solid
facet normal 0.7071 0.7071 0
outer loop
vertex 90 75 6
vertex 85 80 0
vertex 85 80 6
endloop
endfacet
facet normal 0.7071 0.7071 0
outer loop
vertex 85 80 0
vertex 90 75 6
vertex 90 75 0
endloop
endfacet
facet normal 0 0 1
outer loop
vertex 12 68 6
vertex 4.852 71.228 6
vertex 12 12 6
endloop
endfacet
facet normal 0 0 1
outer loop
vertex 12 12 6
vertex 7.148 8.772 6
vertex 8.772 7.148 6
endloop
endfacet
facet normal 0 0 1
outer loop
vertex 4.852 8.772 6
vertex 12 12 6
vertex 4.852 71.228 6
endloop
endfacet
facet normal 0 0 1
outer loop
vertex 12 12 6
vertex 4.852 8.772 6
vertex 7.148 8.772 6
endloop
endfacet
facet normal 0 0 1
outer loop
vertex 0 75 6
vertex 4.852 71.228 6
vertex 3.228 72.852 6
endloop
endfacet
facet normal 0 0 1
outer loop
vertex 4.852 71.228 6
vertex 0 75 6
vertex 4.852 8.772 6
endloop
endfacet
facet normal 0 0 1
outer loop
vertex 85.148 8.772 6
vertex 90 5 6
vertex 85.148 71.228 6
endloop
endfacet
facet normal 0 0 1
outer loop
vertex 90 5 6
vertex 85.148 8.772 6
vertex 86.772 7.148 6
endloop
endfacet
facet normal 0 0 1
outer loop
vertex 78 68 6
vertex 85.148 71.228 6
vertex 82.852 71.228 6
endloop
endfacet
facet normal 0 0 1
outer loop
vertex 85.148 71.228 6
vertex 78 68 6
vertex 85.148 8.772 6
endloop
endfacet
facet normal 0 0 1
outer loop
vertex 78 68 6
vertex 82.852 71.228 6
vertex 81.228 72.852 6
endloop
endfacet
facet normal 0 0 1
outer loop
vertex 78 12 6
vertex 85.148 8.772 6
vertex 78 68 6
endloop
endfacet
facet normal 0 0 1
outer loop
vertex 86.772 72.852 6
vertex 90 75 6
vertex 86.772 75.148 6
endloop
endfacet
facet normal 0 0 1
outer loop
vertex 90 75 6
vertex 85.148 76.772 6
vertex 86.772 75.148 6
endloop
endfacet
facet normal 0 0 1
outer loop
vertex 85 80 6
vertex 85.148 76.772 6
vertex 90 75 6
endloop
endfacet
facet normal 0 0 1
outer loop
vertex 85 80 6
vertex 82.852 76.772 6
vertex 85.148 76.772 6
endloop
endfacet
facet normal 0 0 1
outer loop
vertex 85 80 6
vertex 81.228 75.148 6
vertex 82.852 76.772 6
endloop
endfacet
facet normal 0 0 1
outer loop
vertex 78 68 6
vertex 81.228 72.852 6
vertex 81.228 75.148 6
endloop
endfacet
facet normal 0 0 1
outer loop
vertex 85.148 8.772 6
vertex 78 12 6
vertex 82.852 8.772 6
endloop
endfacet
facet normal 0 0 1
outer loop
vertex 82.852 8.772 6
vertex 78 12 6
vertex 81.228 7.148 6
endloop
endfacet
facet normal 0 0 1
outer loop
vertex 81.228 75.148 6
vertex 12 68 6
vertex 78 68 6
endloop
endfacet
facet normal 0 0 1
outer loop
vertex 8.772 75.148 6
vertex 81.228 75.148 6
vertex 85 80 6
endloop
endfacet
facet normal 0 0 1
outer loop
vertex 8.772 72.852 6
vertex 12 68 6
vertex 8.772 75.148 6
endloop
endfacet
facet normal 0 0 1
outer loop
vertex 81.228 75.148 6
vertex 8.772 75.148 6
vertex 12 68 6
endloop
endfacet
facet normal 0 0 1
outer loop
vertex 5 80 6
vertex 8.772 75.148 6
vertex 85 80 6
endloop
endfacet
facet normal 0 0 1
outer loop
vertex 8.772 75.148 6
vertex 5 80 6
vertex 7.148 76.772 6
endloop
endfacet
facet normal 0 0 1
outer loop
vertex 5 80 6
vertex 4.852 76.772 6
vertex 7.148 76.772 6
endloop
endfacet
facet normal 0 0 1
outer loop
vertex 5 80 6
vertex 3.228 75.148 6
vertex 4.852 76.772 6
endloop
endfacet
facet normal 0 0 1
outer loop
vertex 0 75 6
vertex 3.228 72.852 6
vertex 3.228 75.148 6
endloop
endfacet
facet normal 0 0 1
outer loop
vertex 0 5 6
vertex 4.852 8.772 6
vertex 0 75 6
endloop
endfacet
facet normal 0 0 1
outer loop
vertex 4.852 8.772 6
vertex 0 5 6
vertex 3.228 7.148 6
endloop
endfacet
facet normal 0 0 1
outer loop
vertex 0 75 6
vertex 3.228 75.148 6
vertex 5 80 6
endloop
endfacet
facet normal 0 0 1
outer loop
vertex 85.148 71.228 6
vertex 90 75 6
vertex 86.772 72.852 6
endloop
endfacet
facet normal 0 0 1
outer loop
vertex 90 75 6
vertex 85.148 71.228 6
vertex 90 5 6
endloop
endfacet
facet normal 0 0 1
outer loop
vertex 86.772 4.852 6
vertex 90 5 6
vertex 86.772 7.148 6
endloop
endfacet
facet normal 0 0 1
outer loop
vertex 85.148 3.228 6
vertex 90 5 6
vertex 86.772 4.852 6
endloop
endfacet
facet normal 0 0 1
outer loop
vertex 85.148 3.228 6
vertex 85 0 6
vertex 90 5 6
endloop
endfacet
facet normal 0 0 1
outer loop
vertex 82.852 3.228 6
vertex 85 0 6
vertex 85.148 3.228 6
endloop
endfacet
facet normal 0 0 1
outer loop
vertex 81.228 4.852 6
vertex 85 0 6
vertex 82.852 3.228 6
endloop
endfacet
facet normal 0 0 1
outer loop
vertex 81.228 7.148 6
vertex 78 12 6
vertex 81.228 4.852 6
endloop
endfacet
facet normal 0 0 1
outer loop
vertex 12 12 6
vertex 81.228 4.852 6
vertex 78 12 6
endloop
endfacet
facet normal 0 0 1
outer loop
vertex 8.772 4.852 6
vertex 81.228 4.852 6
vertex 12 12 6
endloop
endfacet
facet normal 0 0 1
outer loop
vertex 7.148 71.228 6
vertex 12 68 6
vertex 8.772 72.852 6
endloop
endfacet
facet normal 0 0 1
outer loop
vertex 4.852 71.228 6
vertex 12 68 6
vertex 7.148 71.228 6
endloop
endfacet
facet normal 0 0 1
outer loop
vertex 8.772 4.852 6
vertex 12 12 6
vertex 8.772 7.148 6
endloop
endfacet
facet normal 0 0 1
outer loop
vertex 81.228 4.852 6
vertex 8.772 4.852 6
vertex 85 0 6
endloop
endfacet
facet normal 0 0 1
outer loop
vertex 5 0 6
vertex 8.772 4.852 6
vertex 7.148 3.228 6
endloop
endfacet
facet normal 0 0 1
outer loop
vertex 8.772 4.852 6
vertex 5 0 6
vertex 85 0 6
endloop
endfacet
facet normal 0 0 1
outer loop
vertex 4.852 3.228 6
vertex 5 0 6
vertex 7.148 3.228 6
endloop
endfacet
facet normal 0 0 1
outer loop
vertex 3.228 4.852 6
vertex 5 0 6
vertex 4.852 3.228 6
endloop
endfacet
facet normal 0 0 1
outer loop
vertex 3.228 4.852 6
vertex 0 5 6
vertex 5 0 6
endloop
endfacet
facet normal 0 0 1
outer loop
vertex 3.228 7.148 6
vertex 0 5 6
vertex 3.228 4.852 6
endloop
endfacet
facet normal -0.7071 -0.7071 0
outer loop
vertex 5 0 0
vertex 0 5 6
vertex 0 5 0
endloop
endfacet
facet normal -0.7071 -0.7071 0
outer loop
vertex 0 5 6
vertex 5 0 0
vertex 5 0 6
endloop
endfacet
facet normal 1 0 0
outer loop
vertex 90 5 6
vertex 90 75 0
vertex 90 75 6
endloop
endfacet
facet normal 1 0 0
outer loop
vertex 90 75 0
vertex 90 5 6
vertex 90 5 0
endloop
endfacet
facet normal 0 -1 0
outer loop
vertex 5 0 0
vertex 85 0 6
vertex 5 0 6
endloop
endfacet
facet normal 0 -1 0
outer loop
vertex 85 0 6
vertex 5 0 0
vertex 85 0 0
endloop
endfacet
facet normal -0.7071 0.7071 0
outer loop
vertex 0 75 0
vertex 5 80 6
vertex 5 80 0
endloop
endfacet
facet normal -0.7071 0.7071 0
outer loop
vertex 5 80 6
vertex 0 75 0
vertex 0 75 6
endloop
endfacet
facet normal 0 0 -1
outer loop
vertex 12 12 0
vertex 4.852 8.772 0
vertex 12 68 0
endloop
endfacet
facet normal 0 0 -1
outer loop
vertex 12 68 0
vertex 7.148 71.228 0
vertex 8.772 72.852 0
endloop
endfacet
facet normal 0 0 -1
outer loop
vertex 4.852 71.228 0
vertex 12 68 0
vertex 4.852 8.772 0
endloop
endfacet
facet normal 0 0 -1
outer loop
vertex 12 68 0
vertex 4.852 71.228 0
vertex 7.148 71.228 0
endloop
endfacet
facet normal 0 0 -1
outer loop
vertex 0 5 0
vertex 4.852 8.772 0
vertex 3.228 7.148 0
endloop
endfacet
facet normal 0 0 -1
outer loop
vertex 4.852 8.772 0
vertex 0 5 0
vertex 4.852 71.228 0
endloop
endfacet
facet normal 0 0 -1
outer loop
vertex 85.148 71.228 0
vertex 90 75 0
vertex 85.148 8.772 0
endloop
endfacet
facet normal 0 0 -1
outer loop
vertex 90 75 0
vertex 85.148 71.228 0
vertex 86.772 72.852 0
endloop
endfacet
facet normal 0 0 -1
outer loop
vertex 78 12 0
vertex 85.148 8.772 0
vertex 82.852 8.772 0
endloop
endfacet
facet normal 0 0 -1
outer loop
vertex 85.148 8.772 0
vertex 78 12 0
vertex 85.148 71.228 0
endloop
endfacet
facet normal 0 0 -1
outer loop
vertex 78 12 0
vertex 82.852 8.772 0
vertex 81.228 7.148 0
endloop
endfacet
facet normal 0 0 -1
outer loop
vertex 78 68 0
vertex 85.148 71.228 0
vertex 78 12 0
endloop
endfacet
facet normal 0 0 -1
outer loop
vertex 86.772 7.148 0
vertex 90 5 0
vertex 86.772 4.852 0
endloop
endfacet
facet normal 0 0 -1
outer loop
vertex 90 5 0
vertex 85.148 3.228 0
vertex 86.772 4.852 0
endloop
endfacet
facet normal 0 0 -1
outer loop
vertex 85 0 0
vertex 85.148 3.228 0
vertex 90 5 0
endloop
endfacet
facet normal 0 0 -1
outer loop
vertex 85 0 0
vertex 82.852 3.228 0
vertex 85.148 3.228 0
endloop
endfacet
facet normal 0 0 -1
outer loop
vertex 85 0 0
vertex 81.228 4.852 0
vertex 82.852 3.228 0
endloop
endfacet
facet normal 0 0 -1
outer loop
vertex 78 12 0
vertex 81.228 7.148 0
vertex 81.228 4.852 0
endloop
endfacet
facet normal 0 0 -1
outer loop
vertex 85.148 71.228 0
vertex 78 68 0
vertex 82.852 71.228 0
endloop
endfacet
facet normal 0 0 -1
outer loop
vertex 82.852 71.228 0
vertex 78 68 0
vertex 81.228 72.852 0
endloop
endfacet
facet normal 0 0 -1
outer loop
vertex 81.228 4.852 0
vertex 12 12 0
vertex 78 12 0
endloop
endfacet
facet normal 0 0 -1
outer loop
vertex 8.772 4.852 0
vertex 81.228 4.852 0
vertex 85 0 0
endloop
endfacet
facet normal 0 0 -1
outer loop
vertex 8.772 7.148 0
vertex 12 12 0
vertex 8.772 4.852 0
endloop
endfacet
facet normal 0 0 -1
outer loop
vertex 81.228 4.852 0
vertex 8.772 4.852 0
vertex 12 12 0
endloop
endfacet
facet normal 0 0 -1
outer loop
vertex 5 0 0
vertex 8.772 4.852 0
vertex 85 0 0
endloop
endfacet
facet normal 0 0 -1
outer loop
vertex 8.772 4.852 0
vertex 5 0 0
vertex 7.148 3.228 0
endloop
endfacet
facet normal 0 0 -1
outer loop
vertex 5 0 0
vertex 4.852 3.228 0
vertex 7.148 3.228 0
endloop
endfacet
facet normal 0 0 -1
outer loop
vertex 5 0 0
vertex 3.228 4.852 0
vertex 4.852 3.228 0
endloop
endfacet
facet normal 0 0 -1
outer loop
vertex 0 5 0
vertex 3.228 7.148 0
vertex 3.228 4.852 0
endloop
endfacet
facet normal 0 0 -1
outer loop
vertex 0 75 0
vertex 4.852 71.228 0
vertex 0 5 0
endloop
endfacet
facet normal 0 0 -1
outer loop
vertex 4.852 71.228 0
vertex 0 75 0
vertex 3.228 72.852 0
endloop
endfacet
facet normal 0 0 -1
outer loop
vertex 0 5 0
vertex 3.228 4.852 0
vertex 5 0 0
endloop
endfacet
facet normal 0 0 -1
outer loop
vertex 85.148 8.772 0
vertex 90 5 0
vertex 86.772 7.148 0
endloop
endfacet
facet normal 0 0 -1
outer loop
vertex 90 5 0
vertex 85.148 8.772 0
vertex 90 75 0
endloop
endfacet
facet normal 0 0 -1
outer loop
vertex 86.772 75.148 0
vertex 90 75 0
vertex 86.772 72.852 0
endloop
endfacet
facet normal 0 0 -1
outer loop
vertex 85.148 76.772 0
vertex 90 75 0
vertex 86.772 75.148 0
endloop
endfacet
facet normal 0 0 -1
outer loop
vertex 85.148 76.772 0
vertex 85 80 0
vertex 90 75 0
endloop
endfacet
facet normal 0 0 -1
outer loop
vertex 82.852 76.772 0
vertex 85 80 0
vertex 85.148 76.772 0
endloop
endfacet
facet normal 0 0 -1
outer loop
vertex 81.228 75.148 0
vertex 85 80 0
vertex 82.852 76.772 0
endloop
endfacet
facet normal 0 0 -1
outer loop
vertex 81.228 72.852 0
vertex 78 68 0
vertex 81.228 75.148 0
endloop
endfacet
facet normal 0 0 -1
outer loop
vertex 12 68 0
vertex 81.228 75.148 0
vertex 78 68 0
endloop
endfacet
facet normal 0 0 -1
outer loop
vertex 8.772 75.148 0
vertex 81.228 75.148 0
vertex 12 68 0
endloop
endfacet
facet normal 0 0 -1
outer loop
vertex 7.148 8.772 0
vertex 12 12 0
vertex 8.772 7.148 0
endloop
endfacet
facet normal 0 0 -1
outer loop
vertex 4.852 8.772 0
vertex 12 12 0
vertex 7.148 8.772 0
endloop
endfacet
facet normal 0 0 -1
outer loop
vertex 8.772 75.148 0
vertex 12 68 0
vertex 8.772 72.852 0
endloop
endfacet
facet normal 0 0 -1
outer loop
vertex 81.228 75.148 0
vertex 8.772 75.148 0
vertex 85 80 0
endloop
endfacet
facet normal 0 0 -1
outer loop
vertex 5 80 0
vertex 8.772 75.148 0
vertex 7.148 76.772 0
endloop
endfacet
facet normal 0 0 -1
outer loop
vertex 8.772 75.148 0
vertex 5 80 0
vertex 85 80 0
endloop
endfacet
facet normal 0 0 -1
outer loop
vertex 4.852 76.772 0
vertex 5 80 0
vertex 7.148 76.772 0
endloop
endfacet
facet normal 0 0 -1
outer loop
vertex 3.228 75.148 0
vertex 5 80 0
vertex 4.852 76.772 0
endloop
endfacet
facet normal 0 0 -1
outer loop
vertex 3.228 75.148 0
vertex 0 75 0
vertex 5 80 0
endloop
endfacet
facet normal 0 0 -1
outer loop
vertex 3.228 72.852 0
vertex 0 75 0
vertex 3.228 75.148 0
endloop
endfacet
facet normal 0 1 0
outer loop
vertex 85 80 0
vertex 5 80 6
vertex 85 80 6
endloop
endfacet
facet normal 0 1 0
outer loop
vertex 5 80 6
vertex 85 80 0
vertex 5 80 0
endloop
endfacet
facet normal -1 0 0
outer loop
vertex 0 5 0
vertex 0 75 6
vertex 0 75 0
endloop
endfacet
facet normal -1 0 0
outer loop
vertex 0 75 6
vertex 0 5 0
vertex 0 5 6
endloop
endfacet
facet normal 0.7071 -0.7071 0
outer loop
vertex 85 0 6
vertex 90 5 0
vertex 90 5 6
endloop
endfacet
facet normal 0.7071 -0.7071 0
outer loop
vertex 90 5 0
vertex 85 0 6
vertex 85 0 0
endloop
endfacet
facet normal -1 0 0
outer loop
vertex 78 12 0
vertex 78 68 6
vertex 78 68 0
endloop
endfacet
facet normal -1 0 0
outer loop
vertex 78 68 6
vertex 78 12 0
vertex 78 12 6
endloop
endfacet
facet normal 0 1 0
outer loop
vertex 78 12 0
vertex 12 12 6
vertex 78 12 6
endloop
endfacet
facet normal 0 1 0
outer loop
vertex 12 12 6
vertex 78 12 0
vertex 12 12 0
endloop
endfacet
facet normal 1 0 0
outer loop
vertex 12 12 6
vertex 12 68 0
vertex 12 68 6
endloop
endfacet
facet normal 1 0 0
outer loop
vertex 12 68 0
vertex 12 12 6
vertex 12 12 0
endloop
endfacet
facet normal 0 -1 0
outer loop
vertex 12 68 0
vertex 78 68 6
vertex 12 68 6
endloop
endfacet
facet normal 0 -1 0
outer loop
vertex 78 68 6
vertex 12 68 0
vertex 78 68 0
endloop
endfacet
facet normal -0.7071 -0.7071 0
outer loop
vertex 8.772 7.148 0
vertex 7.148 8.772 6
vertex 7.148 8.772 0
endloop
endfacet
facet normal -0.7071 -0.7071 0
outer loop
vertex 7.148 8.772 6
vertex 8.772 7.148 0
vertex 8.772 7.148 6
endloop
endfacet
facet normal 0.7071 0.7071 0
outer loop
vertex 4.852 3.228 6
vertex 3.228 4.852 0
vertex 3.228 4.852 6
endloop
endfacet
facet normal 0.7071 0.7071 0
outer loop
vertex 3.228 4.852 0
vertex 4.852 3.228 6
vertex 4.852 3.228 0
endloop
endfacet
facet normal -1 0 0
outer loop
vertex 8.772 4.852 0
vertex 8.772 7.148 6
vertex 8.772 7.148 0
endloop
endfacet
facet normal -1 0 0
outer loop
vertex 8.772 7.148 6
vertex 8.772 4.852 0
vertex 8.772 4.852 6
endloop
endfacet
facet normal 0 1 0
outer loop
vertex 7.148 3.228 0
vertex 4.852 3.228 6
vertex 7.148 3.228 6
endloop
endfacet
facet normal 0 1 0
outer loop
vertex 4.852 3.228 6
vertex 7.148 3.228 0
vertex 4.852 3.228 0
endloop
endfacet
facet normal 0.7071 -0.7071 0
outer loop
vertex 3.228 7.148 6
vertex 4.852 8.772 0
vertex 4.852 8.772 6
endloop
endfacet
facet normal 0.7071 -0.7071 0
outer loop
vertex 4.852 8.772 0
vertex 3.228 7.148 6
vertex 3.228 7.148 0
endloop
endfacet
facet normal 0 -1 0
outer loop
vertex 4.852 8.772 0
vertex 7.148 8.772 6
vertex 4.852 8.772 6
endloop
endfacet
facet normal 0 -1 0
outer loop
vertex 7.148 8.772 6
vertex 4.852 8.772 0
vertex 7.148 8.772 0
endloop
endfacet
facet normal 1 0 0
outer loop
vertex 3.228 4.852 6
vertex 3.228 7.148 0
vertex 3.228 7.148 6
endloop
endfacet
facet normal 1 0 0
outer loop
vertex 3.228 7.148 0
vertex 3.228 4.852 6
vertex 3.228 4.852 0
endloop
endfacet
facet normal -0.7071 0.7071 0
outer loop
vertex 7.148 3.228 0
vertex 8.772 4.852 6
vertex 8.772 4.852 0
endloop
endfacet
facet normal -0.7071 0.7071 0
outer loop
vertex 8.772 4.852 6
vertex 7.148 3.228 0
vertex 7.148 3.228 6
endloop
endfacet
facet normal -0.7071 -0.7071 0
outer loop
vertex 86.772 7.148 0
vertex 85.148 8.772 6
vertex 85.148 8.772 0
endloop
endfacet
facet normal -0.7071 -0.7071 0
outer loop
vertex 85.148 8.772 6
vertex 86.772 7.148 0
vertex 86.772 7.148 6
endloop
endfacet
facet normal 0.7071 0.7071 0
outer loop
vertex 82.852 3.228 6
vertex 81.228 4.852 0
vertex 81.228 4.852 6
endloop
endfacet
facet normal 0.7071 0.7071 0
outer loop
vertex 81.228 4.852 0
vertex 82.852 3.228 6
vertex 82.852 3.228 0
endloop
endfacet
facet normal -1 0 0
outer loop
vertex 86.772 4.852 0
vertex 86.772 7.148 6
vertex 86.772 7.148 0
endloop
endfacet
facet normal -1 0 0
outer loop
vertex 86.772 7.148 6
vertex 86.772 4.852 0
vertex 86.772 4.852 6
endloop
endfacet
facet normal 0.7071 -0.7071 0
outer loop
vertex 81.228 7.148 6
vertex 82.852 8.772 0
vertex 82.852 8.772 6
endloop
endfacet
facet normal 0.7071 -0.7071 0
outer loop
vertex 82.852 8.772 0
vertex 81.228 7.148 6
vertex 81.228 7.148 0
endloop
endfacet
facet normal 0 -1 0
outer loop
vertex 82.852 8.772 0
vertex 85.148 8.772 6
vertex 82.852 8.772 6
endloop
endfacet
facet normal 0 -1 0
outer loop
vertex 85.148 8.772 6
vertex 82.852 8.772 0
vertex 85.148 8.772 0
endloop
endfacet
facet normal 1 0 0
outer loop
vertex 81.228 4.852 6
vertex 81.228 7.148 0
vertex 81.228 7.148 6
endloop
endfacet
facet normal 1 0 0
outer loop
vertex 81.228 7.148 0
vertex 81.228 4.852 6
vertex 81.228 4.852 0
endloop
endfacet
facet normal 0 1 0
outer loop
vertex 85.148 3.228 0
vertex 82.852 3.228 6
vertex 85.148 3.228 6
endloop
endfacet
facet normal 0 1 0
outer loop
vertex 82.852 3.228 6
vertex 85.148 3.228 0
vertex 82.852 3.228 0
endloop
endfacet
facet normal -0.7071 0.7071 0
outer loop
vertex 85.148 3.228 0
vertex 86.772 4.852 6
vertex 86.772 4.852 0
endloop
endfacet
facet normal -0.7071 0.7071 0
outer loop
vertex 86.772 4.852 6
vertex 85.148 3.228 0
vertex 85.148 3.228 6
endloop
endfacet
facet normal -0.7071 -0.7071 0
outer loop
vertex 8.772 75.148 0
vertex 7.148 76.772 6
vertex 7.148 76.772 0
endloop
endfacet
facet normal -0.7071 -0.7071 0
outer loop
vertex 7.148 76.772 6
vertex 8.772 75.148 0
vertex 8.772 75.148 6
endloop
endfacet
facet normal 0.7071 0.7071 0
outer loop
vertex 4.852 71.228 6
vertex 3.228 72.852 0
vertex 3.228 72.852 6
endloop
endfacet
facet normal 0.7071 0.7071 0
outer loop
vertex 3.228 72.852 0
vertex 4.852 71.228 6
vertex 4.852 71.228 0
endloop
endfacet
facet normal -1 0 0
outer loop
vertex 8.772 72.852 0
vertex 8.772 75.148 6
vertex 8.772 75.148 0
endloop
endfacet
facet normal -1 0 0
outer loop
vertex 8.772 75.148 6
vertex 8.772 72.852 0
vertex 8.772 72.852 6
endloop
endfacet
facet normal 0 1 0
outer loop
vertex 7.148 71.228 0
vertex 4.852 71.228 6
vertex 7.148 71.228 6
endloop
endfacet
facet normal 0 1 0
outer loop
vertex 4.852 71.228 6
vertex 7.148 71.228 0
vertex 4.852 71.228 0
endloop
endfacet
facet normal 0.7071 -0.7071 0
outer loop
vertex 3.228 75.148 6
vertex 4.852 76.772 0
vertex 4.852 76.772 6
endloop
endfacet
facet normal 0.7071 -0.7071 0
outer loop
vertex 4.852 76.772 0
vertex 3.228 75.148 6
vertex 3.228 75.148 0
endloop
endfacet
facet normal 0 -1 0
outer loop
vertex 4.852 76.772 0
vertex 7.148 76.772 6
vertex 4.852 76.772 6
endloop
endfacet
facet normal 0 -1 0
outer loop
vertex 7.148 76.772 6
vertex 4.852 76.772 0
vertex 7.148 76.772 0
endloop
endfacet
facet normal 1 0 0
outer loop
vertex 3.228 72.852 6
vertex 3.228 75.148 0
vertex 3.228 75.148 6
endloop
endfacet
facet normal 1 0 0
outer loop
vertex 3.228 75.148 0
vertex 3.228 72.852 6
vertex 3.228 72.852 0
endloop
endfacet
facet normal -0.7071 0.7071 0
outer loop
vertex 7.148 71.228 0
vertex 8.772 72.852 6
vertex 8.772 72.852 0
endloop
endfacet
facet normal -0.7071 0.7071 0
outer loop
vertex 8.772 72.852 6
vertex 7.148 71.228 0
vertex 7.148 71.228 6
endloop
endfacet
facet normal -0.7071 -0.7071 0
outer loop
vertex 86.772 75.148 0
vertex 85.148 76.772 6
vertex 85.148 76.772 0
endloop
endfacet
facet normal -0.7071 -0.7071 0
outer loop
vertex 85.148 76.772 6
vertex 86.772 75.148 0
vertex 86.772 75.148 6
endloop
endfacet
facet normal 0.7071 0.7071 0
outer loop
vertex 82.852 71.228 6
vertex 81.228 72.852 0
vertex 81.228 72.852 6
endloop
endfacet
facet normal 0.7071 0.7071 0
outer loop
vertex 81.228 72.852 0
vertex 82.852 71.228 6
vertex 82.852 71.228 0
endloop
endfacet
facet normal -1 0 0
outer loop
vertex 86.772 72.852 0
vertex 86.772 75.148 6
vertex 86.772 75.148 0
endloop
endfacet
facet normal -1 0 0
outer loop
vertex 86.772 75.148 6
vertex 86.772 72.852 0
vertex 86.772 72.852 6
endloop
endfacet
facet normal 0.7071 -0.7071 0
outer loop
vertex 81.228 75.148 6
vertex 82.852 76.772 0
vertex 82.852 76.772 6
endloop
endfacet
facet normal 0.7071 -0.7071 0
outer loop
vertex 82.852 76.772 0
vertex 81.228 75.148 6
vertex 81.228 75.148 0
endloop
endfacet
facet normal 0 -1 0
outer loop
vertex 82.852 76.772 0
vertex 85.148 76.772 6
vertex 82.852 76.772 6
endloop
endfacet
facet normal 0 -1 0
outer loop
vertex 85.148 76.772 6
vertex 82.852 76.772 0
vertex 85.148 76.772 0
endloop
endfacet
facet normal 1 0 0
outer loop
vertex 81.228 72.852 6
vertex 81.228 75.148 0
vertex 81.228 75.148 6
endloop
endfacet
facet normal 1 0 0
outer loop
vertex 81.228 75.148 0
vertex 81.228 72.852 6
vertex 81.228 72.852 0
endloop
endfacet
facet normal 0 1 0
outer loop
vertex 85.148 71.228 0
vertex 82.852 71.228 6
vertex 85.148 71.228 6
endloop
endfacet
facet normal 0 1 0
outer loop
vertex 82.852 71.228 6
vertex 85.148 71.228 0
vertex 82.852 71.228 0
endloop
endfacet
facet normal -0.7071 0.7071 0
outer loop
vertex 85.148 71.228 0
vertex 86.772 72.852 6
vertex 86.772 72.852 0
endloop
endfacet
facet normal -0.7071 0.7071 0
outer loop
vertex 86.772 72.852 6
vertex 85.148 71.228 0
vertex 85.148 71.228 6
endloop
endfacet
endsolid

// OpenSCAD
$fn = 32;

// ----------------------------------------------------------------------
// Frame plate: 90 x 80 frame, 12 mm rails
// ----------------------------------------------------------------------

// --- parameters (mm) ---
plate_l = 90;             // plate length, X
plate_w = 80;             // plate width, Y
plate_t = 6;              // plate thickness, Z (extrusion height)
corner_c = 5;             // corner chamfer
frame_bar = 12;           // frame rail width
bolt_r = 3;               // corner bolt window radius
bolt_inset = 6;           // bolt centre inset from the edges

win_l = plate_l - 2 * frame_bar;  // window length
win_w = plate_w - 2 * frame_bar;  // window width
bolt_d = 2 * bolt_r;  // corner hole diameter

profile = [[5, 0], [85, 0], [90, 5], [90, 75], [85, 80], [5, 80], [0, 75], [0, 5]];  // primary outline, 8 points, counter clockwise
void_1 = [[12, 12], [78, 12], [78, 68], [12, 68]];  // the window, 4 points
void_2 = [[8.772, 7.148], [7.148, 8.772], [4.852, 8.772], [3.228, 7.148], [3.228, 4.852], [4.852, 3.228], [7.148, 3.228], [8.772, 4.852]];  // corner bolt window, 8 points
void_3 = [[86.772, 7.148], [85.148, 8.772], [82.852, 8.772], [81.228, 7.148], [81.228, 4.852], [82.852, 3.228], [85.148, 3.228], [86.772, 4.852]];  // corner bolt window, 8 points
void_4 = [[8.772, 75.148], [7.148, 76.772], [4.852, 76.772], [3.228, 75.148], [3.228, 72.852], [4.852, 71.228], [7.148, 71.228], [8.772, 72.852]];  // corner bolt window, 8 points
void_5 = [[86.772, 75.148], [85.148, 76.772], [82.852, 76.772], [81.228, 75.148], [81.228, 72.852], [82.852, 71.228], [85.148, 71.228], [86.772, 72.852]];  // corner bolt window, 8 points

// --- the one profile operation ---
difference() {
  linear_extrude(height = plate_t) polygon(points = profile);
  translate([0, 0, -1])
    linear_extrude(height = plate_t + 2) polygon(points = void_1);
  translate([0, 0, -1])
    linear_extrude(height = plate_t + 2) polygon(points = void_2);
  translate([0, 0, -1])
    linear_extrude(height = plate_t + 2) polygon(points = void_3);
  translate([0, 0, -1])
    linear_extrude(height = plate_t + 2) polygon(points = void_4);
  translate([0, 0, -1])
    linear_extrude(height = plate_t + 2) polygon(points = void_5);
}
